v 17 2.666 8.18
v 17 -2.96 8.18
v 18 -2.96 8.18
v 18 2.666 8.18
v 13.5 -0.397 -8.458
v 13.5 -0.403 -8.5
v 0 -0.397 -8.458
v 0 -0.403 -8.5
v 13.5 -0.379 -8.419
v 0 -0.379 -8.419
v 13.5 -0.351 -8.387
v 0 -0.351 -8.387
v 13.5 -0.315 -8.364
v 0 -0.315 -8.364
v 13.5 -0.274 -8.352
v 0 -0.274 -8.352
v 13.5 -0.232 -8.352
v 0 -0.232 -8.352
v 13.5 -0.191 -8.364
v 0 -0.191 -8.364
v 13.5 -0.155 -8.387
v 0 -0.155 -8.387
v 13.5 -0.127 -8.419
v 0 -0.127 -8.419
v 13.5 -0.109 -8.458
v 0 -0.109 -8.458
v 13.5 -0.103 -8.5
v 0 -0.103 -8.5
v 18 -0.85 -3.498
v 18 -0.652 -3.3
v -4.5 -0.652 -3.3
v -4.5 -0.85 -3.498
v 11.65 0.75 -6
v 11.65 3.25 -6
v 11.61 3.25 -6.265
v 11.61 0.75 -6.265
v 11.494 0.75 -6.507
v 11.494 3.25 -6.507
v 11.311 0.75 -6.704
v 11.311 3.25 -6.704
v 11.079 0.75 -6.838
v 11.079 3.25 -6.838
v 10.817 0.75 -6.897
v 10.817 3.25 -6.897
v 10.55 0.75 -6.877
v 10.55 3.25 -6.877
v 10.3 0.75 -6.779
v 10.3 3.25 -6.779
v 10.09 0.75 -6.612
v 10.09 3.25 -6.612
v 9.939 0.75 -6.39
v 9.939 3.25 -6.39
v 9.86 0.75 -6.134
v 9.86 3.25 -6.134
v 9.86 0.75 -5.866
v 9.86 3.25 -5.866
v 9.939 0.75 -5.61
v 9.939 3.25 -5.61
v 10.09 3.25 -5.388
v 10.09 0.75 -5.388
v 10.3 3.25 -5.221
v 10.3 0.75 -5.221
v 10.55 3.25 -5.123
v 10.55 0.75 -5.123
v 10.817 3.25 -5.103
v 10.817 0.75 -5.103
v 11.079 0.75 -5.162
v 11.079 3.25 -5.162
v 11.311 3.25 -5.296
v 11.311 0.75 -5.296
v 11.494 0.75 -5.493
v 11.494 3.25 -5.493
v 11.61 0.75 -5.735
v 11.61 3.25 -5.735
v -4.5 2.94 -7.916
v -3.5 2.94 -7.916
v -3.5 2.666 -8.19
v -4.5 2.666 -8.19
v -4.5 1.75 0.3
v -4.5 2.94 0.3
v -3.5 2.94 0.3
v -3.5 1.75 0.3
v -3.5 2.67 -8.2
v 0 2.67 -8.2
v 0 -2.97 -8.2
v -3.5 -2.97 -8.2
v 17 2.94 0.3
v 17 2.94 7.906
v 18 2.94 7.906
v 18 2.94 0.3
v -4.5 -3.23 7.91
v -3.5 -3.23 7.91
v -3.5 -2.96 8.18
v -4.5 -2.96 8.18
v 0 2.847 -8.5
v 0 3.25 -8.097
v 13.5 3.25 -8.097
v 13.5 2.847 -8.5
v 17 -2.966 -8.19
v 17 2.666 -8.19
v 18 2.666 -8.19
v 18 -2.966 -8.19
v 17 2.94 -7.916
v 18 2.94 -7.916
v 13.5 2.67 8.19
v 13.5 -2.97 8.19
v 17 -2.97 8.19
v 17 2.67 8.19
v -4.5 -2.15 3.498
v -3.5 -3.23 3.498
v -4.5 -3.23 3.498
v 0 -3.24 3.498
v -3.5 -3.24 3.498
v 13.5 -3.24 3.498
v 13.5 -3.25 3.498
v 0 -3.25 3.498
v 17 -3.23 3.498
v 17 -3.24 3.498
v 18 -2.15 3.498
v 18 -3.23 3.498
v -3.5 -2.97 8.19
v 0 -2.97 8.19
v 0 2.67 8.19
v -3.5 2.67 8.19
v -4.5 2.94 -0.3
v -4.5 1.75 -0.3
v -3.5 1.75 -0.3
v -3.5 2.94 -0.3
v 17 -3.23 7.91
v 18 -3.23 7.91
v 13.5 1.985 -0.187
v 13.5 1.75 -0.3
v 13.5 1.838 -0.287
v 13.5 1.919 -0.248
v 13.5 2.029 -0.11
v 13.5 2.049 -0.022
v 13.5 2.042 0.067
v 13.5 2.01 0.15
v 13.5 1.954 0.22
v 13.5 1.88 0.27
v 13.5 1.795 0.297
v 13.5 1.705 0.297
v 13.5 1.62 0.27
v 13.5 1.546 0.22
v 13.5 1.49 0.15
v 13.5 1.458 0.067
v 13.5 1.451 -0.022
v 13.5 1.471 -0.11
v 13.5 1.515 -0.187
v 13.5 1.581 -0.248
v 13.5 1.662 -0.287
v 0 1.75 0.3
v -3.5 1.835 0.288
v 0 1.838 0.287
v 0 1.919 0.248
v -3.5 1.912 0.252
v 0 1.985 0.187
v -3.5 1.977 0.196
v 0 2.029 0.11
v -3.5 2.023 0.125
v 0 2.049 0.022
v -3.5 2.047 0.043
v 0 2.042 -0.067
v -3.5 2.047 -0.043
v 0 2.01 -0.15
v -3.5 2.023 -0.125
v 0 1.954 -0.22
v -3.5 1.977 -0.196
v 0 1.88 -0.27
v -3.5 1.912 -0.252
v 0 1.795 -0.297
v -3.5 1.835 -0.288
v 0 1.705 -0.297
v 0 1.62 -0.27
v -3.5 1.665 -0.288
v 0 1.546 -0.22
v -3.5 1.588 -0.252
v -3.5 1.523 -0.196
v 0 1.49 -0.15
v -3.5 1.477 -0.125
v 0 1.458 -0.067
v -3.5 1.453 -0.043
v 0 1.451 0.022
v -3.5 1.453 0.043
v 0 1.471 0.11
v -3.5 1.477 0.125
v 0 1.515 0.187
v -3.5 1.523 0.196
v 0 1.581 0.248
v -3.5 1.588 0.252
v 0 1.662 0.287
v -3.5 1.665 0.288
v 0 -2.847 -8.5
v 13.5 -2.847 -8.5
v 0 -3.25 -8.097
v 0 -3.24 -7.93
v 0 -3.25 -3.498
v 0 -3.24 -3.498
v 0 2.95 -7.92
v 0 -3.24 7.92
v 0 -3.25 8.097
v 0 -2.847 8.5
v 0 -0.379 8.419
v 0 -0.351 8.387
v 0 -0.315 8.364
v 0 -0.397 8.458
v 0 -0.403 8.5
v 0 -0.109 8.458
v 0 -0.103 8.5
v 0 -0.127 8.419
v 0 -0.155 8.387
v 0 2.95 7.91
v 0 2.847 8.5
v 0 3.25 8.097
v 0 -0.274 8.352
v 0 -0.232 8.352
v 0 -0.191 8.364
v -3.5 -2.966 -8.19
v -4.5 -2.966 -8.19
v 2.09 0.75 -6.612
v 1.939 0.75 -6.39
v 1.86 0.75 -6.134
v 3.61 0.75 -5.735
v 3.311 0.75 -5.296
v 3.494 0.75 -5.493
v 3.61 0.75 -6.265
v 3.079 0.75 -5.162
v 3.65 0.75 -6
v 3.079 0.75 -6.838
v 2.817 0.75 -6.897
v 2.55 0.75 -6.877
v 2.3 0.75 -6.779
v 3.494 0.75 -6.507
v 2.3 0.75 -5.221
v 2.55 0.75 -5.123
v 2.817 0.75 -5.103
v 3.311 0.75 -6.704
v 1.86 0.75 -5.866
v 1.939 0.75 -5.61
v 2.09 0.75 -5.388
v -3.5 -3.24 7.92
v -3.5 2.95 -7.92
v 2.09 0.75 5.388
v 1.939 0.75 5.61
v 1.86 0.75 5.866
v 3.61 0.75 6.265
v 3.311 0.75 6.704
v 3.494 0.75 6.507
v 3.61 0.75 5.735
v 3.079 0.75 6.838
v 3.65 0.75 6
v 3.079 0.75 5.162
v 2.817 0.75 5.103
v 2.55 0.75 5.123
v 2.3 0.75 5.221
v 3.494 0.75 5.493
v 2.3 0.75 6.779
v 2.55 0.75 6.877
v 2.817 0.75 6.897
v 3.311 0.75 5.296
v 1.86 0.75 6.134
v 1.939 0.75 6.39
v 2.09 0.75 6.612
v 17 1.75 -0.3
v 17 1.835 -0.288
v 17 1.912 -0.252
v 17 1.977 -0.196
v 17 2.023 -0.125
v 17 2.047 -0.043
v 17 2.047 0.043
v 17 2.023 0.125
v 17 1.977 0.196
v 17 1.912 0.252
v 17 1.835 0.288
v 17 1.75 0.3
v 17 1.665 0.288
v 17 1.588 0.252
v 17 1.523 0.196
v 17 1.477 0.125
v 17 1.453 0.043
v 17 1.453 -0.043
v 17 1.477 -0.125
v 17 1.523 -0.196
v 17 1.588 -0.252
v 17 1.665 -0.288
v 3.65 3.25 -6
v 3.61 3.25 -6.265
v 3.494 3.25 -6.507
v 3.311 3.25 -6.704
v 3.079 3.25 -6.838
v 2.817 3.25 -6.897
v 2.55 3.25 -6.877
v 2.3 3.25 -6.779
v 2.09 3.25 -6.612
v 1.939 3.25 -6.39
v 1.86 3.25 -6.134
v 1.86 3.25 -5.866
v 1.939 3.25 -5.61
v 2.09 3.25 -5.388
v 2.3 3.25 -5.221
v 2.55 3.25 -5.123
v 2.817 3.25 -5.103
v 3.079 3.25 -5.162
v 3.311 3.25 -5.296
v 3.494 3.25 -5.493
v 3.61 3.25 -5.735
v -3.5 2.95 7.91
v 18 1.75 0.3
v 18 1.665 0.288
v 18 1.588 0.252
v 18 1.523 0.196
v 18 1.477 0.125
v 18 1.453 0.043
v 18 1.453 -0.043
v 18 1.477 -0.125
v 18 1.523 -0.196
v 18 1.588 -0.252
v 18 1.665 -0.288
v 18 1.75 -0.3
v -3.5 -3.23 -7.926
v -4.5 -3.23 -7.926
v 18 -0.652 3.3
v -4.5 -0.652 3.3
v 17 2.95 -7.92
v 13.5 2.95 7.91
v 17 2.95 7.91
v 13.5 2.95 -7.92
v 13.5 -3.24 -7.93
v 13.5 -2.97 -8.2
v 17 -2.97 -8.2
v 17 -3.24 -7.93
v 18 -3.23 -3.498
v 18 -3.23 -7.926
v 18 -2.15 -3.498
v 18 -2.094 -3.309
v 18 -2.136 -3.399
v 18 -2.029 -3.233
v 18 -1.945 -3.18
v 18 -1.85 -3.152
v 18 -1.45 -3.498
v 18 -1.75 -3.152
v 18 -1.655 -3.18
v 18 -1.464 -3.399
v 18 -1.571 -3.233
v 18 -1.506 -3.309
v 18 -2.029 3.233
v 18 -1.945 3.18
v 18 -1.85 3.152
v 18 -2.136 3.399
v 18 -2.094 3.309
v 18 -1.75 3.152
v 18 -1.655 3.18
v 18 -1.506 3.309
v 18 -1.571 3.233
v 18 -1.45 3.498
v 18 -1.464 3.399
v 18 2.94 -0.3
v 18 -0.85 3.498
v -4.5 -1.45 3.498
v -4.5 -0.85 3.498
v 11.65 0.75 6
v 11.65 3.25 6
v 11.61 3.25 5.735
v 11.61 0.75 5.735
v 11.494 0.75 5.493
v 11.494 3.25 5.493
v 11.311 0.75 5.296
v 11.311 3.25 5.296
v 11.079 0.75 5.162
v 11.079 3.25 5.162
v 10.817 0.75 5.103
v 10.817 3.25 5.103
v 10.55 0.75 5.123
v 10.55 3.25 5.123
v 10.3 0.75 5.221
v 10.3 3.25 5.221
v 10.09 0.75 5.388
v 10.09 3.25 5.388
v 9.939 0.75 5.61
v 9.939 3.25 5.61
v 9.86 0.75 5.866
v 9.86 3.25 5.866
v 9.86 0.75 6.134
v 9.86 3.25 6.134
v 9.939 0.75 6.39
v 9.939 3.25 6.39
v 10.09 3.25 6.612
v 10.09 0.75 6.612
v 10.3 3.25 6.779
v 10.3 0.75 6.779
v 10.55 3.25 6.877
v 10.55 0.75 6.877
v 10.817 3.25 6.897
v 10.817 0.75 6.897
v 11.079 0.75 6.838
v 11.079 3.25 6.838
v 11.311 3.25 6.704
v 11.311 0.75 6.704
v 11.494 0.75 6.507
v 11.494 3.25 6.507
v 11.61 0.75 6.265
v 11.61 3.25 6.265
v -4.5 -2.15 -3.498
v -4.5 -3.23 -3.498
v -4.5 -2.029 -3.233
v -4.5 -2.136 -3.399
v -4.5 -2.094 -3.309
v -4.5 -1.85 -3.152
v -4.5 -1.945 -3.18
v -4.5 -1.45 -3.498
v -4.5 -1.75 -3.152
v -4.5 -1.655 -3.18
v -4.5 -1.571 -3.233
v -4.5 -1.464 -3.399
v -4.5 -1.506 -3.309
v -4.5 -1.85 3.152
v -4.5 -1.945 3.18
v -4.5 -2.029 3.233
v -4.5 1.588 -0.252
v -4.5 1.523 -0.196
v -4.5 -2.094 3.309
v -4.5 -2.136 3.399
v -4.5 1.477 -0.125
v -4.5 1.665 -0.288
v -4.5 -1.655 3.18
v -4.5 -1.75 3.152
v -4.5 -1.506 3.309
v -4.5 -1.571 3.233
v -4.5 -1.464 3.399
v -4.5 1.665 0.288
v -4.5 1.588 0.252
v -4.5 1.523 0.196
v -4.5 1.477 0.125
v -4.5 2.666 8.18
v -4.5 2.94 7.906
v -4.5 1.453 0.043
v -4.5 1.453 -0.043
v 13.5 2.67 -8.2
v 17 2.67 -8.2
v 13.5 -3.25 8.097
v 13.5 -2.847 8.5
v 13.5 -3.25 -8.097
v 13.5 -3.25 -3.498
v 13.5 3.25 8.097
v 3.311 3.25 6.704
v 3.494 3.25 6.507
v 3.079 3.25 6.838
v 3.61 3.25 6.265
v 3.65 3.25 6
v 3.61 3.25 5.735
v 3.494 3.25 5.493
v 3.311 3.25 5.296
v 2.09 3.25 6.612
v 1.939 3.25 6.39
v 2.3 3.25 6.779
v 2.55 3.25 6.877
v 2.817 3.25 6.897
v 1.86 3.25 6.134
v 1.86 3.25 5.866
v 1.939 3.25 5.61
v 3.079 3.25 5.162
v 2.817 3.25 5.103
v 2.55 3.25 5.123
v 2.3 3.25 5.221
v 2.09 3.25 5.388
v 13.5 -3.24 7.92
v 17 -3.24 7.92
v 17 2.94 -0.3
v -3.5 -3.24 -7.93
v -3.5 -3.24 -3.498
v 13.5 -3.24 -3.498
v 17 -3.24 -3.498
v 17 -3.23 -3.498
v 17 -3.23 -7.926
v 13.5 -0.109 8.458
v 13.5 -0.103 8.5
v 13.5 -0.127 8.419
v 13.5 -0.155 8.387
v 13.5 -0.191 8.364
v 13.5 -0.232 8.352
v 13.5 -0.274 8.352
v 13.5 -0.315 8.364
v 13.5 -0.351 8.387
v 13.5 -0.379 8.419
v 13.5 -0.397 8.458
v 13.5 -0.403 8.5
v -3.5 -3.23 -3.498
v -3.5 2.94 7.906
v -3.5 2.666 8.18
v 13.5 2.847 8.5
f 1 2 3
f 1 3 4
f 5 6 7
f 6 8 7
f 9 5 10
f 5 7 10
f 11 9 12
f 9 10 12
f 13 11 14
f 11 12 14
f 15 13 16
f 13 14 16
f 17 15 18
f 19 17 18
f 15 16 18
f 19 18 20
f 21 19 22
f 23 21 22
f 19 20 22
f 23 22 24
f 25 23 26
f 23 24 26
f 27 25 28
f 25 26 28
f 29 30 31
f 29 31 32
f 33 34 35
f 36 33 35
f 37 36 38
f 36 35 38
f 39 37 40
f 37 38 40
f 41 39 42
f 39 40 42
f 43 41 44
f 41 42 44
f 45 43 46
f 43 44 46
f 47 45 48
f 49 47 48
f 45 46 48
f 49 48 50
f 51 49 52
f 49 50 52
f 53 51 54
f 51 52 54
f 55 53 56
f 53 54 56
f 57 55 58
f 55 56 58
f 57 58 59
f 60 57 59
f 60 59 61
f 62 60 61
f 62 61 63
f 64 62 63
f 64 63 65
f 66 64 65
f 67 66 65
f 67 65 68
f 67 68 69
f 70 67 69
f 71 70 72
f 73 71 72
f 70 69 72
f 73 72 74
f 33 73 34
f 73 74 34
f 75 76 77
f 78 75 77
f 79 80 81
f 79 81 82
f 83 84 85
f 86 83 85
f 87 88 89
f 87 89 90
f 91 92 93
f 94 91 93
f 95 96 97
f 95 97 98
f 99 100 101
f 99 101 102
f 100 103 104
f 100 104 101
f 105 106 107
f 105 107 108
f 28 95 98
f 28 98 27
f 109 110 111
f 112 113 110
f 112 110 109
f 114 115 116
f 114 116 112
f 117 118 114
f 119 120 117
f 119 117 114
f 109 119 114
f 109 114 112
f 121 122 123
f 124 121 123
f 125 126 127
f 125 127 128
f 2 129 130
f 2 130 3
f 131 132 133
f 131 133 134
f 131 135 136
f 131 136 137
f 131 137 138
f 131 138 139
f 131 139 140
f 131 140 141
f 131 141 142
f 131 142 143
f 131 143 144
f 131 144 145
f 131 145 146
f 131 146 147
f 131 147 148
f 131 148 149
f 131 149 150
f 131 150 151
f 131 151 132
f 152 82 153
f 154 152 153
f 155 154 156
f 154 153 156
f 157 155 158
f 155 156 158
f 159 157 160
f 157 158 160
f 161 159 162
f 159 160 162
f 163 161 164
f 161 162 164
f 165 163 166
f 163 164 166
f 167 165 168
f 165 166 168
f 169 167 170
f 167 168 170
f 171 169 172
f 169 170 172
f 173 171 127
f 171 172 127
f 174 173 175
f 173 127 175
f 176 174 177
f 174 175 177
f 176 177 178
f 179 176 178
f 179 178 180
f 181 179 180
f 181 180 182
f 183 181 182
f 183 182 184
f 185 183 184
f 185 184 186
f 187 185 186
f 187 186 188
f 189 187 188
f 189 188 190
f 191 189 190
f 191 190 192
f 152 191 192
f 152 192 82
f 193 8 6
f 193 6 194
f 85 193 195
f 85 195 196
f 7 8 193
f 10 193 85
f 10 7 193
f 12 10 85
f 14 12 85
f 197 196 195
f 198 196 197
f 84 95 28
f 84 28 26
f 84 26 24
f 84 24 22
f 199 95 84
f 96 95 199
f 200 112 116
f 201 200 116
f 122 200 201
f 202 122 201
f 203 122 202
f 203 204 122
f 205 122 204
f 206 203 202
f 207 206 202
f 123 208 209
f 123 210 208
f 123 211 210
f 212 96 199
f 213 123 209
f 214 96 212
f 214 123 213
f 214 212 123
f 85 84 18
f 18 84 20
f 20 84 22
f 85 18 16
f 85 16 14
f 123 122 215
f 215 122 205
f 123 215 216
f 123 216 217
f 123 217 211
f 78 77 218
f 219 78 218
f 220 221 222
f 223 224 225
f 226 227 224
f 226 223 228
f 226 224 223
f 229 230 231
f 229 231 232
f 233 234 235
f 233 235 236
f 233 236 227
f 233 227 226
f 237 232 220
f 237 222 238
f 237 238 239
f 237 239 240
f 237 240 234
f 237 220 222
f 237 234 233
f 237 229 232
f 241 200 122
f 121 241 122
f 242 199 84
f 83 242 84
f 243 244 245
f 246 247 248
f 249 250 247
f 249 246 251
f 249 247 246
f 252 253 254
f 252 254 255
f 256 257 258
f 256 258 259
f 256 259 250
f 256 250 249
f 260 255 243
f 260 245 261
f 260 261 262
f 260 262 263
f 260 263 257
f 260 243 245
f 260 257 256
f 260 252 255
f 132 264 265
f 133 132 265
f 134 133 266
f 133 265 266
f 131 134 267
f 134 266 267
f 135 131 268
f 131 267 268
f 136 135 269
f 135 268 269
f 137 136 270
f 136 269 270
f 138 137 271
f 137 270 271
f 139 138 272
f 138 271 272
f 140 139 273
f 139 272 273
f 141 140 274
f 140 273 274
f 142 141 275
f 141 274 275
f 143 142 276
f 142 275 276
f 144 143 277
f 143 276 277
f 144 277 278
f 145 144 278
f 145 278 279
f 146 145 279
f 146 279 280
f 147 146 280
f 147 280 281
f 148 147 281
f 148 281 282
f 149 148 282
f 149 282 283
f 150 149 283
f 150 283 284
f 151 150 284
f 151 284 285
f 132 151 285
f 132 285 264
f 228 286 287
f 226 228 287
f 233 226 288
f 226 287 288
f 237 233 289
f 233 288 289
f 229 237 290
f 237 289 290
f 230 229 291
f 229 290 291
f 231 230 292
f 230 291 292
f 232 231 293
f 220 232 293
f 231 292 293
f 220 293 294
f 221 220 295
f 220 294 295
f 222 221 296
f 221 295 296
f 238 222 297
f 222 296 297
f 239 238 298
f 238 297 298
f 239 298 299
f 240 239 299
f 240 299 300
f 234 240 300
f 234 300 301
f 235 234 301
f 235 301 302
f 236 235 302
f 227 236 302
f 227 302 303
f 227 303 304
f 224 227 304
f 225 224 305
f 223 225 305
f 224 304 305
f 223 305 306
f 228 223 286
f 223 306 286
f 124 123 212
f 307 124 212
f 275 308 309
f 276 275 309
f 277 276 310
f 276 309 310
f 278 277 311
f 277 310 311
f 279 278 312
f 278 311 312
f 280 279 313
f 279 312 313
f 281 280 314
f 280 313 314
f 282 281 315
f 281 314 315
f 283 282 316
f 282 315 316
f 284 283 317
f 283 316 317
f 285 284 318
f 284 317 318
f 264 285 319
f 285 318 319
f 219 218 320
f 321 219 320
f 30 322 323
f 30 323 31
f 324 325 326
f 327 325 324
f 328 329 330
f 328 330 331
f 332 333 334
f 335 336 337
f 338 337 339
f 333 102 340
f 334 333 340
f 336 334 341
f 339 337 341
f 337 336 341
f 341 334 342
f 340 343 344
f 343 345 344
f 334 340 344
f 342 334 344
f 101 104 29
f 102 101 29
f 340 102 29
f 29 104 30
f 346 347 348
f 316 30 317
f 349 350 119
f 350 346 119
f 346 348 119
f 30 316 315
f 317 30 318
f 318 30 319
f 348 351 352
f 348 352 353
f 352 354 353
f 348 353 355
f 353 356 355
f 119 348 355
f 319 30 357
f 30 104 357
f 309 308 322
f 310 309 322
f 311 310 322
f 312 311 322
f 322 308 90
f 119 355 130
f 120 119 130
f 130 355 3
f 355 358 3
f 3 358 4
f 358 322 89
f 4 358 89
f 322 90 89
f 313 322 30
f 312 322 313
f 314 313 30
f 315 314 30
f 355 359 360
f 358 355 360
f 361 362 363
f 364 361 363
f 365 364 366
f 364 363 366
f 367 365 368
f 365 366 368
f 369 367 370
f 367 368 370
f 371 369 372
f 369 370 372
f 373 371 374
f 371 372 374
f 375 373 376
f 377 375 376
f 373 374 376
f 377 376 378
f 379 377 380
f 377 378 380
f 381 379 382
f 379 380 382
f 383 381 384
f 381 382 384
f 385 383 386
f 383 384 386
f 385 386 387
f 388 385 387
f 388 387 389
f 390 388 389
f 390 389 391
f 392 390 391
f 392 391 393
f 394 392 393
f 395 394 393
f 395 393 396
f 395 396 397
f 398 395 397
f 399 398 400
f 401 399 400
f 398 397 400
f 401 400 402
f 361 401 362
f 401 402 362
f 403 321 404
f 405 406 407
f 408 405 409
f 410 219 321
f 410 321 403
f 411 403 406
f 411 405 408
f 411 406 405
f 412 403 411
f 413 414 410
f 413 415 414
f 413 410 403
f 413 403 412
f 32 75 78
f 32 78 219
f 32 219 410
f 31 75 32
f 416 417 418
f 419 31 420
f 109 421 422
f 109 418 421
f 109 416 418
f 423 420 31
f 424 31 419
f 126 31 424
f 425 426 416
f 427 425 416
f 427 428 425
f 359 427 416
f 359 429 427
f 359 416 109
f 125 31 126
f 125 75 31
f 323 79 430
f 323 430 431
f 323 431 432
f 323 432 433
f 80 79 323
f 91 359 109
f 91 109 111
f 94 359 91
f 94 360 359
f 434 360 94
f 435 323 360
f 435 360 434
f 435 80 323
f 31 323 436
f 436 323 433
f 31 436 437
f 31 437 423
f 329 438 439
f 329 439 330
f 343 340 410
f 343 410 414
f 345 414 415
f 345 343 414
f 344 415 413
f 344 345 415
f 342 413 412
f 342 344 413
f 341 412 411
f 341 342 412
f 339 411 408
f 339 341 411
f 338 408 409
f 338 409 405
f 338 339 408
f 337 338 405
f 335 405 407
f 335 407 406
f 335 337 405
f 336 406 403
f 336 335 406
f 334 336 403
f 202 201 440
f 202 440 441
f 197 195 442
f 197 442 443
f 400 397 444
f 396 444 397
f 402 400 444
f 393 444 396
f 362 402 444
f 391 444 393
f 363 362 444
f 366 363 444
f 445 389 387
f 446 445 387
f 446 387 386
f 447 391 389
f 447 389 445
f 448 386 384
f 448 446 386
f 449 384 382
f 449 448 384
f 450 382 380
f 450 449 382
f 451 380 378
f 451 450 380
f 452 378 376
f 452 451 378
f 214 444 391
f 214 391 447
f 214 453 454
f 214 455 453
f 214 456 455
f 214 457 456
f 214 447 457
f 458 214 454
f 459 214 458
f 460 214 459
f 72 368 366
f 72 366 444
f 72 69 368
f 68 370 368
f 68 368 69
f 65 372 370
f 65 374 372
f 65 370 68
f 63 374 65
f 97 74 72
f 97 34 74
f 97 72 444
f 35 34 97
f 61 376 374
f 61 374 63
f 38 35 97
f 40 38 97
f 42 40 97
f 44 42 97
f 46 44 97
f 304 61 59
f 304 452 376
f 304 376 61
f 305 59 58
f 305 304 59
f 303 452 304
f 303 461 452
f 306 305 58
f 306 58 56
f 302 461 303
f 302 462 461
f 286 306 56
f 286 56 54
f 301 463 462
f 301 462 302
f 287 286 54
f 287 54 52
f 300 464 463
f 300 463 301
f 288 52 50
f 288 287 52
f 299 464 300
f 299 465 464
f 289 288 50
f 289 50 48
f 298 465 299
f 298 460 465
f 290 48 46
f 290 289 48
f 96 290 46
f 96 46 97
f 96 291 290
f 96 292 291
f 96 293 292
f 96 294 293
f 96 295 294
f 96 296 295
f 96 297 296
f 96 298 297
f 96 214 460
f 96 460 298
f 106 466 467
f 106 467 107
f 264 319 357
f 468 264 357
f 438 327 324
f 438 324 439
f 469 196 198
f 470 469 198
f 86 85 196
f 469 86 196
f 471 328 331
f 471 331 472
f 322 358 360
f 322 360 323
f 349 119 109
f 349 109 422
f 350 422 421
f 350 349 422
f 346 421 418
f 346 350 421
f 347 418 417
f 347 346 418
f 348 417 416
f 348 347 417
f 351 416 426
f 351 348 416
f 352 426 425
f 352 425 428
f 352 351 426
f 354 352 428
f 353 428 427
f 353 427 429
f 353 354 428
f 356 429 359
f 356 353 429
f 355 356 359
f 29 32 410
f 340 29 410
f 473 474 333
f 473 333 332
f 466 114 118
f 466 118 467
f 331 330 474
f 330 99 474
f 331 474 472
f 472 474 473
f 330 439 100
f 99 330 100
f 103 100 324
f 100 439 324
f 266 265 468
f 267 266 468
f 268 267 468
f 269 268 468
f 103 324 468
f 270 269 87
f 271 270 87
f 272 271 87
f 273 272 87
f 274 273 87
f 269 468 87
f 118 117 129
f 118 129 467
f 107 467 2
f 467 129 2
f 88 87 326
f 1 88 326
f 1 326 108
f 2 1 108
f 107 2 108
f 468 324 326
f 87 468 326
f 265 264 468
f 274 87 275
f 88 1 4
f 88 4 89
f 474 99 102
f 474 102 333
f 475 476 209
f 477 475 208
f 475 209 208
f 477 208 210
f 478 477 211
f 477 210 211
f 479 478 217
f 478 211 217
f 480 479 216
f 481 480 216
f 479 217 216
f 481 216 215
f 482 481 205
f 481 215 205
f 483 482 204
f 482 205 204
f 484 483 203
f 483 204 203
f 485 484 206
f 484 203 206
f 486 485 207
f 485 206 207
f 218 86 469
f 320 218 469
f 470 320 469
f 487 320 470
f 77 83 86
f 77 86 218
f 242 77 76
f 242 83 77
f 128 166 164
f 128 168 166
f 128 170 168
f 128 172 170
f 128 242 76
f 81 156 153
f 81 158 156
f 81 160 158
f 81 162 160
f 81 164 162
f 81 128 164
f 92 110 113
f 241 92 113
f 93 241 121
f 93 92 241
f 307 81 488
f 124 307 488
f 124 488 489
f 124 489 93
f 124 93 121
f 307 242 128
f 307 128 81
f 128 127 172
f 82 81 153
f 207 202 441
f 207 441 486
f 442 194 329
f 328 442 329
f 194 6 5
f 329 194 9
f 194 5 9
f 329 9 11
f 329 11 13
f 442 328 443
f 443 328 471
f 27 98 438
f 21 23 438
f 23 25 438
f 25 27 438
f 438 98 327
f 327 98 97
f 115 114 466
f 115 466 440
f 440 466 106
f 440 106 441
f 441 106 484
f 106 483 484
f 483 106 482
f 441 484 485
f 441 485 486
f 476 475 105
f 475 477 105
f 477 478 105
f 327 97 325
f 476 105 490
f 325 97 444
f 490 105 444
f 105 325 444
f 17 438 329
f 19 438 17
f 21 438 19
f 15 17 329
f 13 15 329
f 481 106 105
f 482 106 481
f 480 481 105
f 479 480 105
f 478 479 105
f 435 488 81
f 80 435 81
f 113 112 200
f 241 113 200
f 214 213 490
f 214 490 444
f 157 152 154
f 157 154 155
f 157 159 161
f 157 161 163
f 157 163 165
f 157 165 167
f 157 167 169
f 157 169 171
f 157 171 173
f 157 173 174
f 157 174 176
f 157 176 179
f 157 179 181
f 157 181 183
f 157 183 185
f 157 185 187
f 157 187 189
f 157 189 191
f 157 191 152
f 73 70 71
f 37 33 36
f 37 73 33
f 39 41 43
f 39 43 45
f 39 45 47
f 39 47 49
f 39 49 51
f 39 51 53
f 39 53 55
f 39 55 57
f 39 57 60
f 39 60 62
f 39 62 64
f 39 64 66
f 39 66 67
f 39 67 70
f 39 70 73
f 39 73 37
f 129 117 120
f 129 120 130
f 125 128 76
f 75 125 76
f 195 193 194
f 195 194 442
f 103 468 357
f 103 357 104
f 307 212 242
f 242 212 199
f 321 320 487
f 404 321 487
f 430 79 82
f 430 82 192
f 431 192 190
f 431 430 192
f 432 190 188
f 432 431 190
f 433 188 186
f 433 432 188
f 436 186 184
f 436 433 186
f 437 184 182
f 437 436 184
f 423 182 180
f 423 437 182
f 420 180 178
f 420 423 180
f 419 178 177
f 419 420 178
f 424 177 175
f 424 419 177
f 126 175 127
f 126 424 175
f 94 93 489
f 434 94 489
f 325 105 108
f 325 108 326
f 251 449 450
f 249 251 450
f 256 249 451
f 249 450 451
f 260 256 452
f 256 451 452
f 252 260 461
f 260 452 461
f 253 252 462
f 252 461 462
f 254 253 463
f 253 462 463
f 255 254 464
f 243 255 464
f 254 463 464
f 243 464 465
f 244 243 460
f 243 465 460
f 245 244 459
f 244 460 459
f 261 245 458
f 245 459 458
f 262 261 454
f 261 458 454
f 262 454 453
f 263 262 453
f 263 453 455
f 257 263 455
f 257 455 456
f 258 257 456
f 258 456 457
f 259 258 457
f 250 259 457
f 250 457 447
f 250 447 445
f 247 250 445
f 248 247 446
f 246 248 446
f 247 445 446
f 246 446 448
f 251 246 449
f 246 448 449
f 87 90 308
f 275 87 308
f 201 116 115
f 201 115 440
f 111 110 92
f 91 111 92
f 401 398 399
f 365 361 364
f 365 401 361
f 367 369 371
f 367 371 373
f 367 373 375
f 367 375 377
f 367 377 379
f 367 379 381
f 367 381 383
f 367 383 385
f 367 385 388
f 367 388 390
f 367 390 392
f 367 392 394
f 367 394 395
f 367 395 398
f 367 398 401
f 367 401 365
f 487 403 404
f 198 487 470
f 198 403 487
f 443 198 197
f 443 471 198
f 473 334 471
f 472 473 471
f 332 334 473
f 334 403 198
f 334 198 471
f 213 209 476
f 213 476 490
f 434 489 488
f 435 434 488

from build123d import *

# Parameters (mm, degrees)
EXTRUDE_1_DEPTH      = 13.5
SKETCH_3_R           = 0.15
CUT_EXTRUDE_2_DEPTH  = 13.5
EXTRUDE_2_DEPTH      = 3.5
EXTRUDE_2_DEPTH_BACK = 17
EXTRUDE_3_DEPTH      = 1
EXTRUDE_3_DEPTH_BACK = 21.5
SKETCH_2_R           = 0.9
CUT_EXTRUDE_1_DEPTH  = 2.5
CUT_EXTRUDE_3_DEPTH  = 1
CUT_EXTRUDE_4_DEPTH  = 1
SKETCH_8_R           = 0.3
CUT_EXTRUDE_5_DEPTH  = 4.5
SKETCH_9_R           = 0.3
CUT_EXTRUDE_6_DEPTH  = 4.5
CUT_EXTRUDE_7_DEPTH  = 22.5


with BuildPart() as part:
    # 草图1 → 凸台-拉伸1 (new body)
    with BuildSketch(Plane(origin=(0, 0, 0), x_dir=(0, 0, -1), z_dir=(1, 0, 0))):
        Polygon((-8.5, 2.846949135), (-8.096949135, 3.25), (8.096949135, 3.25), (8.5, 2.846949135), (8.5, -2.846949135), (8.096949135, -3.25), (-8.096949135, -3.25), (-8.5, -2.846949135), align=None)
    extrude(amount=EXTRUDE_1_DEPTH)

    # 草图3 → 切除-拉伸2 (cut)
    with BuildSketch(Plane.ZY):
        with Locations((8.5, -0.253050865)):
            Circle(SKETCH_3_R)
        with Locations((-8.5, -0.253050865)):
            Circle(SKETCH_3_R)
    extrude(amount=-CUT_EXTRUDE_2_DEPTH, mode=Mode.SUBTRACT)

    # 草图4 → 凸台-拉伸2 (add, two sides)
    with BuildSketch(Plane.ZY) as extrude_2_sk:
        Polygon((8.19, -2.970178628), (8.19, 2.67), (7.91, 2.95), (-7.92, 2.95), (-8.2, 2.67), (-8.2, -2.970178628), (-7.930178628, -3.24), (7.920178628, -3.24), align=None)
    extrude(amount=EXTRUDE_2_DEPTH)
    extrude(extrude_2_sk.sketch, amount=-EXTRUDE_2_DEPTH_BACK)

    # 草图5 → 凸台-拉伸3 (add, two sides)
    with BuildSketch(Plane(origin=(17, 0, 0), x_dir=(0, 0, -1), z_dir=(1, 0, 0))) as extrude_3_sk:
        Polygon((-7.905857864, 2.94), (7.915857864, 2.94), (8.19, 2.665857864), (8.19, -2.966036493), (7.926036493, -3.23), (-7.910178628, -3.23), (-8.18, -2.960178628), (-8.18, 2.665857864), align=None)
    extrude(amount=EXTRUDE_3_DEPTH)
    extrude(extrude_3_sk.sketch, amount=-EXTRUDE_3_DEPTH_BACK)

    # 草图2 → 切除-拉伸1 (cut)
    with BuildSketch(Plane(origin=(0, 3.25, 0), x_dir=(1, 0, 0), z_dir=(0, 1, 0))):
        with Locations((2.75, 6)):
            Circle(SKETCH_2_R)
        with Locations((10.75, 6)):
            Circle(SKETCH_2_R)
        with Locations((10.75, -6)):
            Circle(SKETCH_2_R)
        with Locations((2.75, -6)):
            Circle(SKETCH_2_R)
    extrude(amount=-CUT_EXTRUDE_1_DEPTH, mode=Mode.SUBTRACT)

    # 草图6 → 切除-拉伸3 (cut)
    with BuildSketch(Plane(origin=(18, 0, 0), x_dir=(0, 0, -1), z_dir=(1, 0, 0))):
        with BuildLine():
            Line((0.3, 1.75), (0.3, 2.94))
            Line((0.3, 2.94), (-0.3, 2.94))
            Line((-0.3, 2.94), (-0.3, 1.75))
            ThreePointArc((-0.3, 1.75), (0, 1.45), (0.3, 1.75))
        make_face()
    extrude(amount=-CUT_EXTRUDE_3_DEPTH, mode=Mode.SUBTRACT)

    # 草图7 → 切除-拉伸4 (cut)
    with BuildSketch(Plane.ZY.offset(4.5)):
        with BuildLine():
            Line((-0.3, 1.75), (-0.3, 2.94))
            Line((-0.3, 2.94), (0.3, 2.94))
            Line((0.3, 2.94), (0.3, 1.75))
            ThreePointArc((0.3, 1.75), (0, 1.45), (-0.3, 1.75))
        make_face()
    extrude(amount=-CUT_EXTRUDE_4_DEPTH, mode=Mode.SUBTRACT)

    # 草图8 → 切除-拉伸5 (cut)
    with BuildSketch(Plane.ZY.offset(4.5)):
        with Locations((0, 1.75)):
            Circle(SKETCH_8_R)
    extrude(amount=-CUT_EXTRUDE_5_DEPTH, mode=Mode.SUBTRACT)

    # 草图9 → 切除-拉伸6 (cut)
    with BuildSketch(Plane(origin=(18, 0, 0), x_dir=(0, 0, -1), z_dir=(1, 0, 0))):
        with Locations((0, 1.75)):
            Circle(SKETCH_9_R)
    extrude(amount=-CUT_EXTRUDE_6_DEPTH, mode=Mode.SUBTRACT)

    # 草图10 → 切除-拉伸7 (cut)
    with BuildSketch(Plane(origin=(18, 0, 0), x_dir=(0, 0, -1), z_dir=(1, 0, 0))):
        with BuildLine():
            Line((3.497989899, -2.15), (3.497989899, -3.25))
            Line((3.497989899, -3.25), (-3.497989899, -3.25))
            Line((-3.497989899, -3.25), (-3.497989899, -2.15))
            ThreePointArc((-3.497989899, -2.15), (-3.147989899, -1.8), (-3.497989899, -1.45))
            Line((-3.497989899, -1.45), (-3.497989899, -0.85))
            Line((-3.497989899, -0.85), (-3.3, -0.652010101))
            Line((-3.3, -0.652010101), (3.3, -0.652010101))
            Line((3.3, -0.652010101), (3.497989899, -0.85))
            Line((3.497989899, -0.85), (3.497989899, -1.45))
            ThreePointArc((3.497989899, -1.45), (3.147989899, -1.8), (3.497989899, -2.15))
        make_face()
    extrude(amount=-CUT_EXTRUDE_7_DEPTH, mode=Mode.SUBTRACT)


solid = part.part
